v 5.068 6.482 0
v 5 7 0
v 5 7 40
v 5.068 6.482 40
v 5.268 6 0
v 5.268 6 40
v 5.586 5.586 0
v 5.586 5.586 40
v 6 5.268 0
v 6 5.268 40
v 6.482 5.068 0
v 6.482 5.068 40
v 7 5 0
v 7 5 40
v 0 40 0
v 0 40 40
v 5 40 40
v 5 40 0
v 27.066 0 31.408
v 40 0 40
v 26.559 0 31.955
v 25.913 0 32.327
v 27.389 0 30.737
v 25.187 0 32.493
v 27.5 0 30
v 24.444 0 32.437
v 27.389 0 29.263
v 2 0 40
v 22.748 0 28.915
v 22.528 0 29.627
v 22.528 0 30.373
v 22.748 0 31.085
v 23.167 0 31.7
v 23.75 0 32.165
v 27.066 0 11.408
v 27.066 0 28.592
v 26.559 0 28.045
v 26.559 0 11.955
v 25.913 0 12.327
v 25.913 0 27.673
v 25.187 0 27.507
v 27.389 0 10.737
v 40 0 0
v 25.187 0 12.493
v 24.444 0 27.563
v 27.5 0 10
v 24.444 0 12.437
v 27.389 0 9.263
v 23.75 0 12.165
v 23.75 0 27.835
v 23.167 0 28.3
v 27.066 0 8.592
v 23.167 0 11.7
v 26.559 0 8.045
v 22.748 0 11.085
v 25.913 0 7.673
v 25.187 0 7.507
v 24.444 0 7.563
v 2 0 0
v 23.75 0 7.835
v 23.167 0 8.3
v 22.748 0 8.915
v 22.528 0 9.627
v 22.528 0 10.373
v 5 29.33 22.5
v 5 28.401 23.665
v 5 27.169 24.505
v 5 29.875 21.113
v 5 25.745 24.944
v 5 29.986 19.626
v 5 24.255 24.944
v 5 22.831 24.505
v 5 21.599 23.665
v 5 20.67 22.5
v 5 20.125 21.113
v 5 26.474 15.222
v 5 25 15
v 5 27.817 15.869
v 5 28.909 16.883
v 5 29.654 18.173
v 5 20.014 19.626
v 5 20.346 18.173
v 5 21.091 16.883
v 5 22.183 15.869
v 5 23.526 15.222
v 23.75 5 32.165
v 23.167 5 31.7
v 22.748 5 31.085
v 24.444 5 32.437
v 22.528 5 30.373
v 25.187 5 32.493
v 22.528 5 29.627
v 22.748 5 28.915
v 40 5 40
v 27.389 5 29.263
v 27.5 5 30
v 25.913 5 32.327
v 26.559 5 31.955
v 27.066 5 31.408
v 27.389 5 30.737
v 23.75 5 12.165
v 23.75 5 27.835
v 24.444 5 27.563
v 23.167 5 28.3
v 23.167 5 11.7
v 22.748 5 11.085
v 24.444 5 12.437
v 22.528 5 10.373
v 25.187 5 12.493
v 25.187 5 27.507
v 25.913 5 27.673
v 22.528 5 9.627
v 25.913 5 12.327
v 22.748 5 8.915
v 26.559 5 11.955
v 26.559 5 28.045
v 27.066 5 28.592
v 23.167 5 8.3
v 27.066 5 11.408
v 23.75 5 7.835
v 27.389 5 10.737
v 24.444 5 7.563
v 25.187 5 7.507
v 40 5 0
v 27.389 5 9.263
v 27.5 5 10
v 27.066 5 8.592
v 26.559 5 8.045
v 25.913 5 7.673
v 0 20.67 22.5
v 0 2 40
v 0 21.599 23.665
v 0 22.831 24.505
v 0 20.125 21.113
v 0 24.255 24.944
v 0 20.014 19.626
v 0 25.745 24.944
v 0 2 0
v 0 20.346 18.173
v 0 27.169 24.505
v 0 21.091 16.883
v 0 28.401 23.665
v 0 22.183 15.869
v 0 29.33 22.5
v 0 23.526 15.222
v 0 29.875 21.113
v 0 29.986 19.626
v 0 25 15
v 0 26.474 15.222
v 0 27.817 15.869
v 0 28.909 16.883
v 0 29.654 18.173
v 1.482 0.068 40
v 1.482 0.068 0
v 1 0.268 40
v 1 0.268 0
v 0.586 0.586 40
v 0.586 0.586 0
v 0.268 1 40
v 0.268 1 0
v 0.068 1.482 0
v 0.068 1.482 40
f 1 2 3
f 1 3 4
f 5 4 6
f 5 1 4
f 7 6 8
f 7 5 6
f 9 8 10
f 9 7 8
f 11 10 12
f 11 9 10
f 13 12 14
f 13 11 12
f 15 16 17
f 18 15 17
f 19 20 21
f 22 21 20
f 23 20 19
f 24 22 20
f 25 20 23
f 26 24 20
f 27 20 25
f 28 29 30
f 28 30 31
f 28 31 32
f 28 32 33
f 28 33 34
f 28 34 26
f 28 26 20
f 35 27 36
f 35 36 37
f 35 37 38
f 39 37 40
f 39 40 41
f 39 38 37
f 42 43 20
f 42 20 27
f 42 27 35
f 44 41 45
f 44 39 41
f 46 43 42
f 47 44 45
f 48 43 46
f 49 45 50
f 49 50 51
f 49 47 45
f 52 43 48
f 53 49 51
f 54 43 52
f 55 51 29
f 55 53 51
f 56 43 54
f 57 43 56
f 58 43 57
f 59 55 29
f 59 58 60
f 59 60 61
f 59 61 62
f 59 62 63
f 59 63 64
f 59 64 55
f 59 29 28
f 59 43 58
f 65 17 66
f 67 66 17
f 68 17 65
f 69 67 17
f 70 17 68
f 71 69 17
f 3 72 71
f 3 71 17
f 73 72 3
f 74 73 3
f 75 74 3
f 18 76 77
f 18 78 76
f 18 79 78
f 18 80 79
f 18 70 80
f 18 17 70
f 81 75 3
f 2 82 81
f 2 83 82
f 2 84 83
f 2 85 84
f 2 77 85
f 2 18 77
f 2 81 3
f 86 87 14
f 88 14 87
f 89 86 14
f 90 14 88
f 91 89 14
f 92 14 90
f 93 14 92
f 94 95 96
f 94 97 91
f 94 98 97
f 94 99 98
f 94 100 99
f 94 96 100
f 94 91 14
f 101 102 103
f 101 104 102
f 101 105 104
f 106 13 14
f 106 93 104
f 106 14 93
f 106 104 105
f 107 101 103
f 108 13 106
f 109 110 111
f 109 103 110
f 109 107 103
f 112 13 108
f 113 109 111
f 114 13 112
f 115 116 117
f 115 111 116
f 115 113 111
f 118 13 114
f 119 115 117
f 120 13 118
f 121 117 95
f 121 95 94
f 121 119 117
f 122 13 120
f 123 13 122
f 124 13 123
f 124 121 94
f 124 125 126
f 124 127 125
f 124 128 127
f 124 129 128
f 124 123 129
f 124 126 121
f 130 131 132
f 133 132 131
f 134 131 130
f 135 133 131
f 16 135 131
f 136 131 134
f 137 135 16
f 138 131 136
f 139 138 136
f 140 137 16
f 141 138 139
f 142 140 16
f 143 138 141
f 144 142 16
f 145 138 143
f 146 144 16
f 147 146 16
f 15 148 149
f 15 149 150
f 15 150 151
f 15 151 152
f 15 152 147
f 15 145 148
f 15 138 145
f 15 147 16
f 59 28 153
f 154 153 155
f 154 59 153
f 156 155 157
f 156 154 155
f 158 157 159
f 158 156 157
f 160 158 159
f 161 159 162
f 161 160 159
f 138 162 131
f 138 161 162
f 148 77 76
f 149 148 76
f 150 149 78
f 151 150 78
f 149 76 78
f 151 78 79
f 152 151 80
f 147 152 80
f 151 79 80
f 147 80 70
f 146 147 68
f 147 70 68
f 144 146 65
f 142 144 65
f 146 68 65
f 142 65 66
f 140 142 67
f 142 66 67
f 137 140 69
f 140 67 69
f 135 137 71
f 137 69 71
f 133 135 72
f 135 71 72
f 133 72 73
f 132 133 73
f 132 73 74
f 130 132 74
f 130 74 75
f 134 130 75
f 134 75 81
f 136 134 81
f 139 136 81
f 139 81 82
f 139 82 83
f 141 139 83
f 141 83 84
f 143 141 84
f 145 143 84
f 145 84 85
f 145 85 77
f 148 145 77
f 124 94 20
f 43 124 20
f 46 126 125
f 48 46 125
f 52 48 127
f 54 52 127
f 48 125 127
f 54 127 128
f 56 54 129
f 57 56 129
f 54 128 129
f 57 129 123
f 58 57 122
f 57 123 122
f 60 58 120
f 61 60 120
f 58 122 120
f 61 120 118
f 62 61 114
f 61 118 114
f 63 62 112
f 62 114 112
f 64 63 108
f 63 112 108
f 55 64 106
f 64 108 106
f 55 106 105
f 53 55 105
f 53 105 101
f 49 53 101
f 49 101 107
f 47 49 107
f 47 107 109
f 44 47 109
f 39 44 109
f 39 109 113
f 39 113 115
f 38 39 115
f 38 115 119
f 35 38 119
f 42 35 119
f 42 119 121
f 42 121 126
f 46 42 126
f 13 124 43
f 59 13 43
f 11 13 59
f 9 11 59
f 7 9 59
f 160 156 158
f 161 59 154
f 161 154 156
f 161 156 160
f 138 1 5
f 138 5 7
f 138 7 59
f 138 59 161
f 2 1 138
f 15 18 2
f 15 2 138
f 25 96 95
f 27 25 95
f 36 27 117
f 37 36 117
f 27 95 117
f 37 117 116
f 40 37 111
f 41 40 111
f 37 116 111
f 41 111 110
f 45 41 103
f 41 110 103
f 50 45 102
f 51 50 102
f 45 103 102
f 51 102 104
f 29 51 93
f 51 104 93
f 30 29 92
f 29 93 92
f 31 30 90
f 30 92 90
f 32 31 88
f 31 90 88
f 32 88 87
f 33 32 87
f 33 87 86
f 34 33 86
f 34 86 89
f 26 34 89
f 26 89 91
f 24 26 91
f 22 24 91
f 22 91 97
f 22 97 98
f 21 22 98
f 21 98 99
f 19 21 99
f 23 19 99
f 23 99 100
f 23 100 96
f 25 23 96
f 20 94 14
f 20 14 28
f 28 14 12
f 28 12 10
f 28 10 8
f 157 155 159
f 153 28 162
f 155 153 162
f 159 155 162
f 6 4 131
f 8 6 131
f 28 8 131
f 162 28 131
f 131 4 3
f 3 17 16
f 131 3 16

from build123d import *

# Parameters (mm, degrees)
BOSS_EXTRUDE1_DEPTH = 40
SKETCH3_R           = 5
CUT_EXTRUDE1_DEPTH  = 40
SKETCH4_R           = 2.5
CUT_EXTRUDE2_DEPTH  = 40


with BuildPart() as part:
    # Sketch2 → Boss-Extrude1 (new body)
    with BuildSketch(Plane.XY):
        with BuildLine():
            Line((0, 2), (0, 40))
            Line((0, 40), (5, 40))
            Line((5, 40), (5, 7))
            ThreePointArc((5, 7), (5.585786438, 5.585786438), (7, 5))
            Line((7, 5), (40, 5))
            Line((40, 5), (40, 0))
            Line((40, 0), (2, 0))
            ThreePointArc((2, 0), (0.585786438, 0.585786438), (0, 2))
        make_face()
    extrude(amount=BOSS_EXTRUDE1_DEPTH)

    # Sketch3 → Cut-Extrude1 (cut)
    with BuildSketch(Plane(origin=(5, 0, 0), x_dir=(0, 0, -1), z_dir=(1, 0, 0))):
        with Locations((-20, 25)):
            Circle(SKETCH3_R)
    extrude(amount=-CUT_EXTRUDE1_DEPTH, mode=Mode.SUBTRACT)

    # Sketch4 → Cut-Extrude2 (cut)
    with BuildSketch(Plane(origin=(0, 5, 0), x_dir=(1, 0, 0), z_dir=(0, 1, 0))):
        with Locations((25, -10)):
            Circle(SKETCH4_R)
        with Locations((25, -30)):
            Circle(SKETCH4_R)
    extrude(amount=-CUT_EXTRUDE2_DEPTH, mode=Mode.SUBTRACT)


solid = part.part
